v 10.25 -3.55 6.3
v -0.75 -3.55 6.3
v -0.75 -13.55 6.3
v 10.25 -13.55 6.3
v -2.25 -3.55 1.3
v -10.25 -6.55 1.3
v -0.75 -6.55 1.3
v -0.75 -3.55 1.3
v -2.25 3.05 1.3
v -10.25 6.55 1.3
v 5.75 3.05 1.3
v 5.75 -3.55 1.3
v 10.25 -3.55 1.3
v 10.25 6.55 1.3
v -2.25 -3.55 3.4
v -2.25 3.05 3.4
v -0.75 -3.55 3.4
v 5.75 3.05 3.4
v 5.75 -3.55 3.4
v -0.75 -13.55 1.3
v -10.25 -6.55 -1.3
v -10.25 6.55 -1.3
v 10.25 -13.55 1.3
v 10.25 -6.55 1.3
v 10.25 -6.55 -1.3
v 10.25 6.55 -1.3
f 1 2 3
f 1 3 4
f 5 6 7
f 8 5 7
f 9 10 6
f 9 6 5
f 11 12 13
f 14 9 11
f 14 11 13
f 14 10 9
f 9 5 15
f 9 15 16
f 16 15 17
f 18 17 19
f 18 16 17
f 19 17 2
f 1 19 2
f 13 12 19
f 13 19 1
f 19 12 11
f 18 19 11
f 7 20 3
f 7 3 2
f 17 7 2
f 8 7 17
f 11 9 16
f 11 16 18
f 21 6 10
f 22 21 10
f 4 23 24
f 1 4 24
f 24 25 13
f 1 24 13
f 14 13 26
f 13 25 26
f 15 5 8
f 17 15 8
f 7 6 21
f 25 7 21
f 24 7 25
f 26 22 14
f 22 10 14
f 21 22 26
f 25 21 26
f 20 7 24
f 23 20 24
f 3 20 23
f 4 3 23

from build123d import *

# Parameters (mm, degrees)
PLACAESBOCO_W      = 20.5
PLACAESBOCO_H      = 13.1
PLACA_DEPTH        = 1.3
CONECTORESBOCO_W   = 11
CONECTORESBOCO_H   = 10
CONECTOR_DEPTH     = 5
RESISTORESESBOCO_W = 8
RESISTORESESBOCO_H = 6.6
RESISTORES_DEPTH   = 2.1


with BuildPart() as part:
    # PlacaEsboco → Placa (new, symmetric)
    with BuildSketch(Plane.XY):
        Rectangle(PLACAESBOCO_W, PLACAESBOCO_H)
    extrude(amount=PLACA_DEPTH, both=True)

    # ConectorEsboco → Conector (add)
    with BuildSketch(Plane.XY.offset(1.3)):
        with Locations((4.75, -8.55)):
            Rectangle(CONECTORESBOCO_W, CONECTORESBOCO_H)
    extrude(amount=CONECTOR_DEPTH)

    # ResistoresEsboco → Resistores (add)
    with BuildSketch(Plane.XY.offset(1.3)):
        with Locations((1.75, -0.25)):
            Rectangle(RESISTORESESBOCO_W, RESISTORESESBOCO_H)
    extrude(amount=RESISTORES_DEPTH)


solid = part.part
